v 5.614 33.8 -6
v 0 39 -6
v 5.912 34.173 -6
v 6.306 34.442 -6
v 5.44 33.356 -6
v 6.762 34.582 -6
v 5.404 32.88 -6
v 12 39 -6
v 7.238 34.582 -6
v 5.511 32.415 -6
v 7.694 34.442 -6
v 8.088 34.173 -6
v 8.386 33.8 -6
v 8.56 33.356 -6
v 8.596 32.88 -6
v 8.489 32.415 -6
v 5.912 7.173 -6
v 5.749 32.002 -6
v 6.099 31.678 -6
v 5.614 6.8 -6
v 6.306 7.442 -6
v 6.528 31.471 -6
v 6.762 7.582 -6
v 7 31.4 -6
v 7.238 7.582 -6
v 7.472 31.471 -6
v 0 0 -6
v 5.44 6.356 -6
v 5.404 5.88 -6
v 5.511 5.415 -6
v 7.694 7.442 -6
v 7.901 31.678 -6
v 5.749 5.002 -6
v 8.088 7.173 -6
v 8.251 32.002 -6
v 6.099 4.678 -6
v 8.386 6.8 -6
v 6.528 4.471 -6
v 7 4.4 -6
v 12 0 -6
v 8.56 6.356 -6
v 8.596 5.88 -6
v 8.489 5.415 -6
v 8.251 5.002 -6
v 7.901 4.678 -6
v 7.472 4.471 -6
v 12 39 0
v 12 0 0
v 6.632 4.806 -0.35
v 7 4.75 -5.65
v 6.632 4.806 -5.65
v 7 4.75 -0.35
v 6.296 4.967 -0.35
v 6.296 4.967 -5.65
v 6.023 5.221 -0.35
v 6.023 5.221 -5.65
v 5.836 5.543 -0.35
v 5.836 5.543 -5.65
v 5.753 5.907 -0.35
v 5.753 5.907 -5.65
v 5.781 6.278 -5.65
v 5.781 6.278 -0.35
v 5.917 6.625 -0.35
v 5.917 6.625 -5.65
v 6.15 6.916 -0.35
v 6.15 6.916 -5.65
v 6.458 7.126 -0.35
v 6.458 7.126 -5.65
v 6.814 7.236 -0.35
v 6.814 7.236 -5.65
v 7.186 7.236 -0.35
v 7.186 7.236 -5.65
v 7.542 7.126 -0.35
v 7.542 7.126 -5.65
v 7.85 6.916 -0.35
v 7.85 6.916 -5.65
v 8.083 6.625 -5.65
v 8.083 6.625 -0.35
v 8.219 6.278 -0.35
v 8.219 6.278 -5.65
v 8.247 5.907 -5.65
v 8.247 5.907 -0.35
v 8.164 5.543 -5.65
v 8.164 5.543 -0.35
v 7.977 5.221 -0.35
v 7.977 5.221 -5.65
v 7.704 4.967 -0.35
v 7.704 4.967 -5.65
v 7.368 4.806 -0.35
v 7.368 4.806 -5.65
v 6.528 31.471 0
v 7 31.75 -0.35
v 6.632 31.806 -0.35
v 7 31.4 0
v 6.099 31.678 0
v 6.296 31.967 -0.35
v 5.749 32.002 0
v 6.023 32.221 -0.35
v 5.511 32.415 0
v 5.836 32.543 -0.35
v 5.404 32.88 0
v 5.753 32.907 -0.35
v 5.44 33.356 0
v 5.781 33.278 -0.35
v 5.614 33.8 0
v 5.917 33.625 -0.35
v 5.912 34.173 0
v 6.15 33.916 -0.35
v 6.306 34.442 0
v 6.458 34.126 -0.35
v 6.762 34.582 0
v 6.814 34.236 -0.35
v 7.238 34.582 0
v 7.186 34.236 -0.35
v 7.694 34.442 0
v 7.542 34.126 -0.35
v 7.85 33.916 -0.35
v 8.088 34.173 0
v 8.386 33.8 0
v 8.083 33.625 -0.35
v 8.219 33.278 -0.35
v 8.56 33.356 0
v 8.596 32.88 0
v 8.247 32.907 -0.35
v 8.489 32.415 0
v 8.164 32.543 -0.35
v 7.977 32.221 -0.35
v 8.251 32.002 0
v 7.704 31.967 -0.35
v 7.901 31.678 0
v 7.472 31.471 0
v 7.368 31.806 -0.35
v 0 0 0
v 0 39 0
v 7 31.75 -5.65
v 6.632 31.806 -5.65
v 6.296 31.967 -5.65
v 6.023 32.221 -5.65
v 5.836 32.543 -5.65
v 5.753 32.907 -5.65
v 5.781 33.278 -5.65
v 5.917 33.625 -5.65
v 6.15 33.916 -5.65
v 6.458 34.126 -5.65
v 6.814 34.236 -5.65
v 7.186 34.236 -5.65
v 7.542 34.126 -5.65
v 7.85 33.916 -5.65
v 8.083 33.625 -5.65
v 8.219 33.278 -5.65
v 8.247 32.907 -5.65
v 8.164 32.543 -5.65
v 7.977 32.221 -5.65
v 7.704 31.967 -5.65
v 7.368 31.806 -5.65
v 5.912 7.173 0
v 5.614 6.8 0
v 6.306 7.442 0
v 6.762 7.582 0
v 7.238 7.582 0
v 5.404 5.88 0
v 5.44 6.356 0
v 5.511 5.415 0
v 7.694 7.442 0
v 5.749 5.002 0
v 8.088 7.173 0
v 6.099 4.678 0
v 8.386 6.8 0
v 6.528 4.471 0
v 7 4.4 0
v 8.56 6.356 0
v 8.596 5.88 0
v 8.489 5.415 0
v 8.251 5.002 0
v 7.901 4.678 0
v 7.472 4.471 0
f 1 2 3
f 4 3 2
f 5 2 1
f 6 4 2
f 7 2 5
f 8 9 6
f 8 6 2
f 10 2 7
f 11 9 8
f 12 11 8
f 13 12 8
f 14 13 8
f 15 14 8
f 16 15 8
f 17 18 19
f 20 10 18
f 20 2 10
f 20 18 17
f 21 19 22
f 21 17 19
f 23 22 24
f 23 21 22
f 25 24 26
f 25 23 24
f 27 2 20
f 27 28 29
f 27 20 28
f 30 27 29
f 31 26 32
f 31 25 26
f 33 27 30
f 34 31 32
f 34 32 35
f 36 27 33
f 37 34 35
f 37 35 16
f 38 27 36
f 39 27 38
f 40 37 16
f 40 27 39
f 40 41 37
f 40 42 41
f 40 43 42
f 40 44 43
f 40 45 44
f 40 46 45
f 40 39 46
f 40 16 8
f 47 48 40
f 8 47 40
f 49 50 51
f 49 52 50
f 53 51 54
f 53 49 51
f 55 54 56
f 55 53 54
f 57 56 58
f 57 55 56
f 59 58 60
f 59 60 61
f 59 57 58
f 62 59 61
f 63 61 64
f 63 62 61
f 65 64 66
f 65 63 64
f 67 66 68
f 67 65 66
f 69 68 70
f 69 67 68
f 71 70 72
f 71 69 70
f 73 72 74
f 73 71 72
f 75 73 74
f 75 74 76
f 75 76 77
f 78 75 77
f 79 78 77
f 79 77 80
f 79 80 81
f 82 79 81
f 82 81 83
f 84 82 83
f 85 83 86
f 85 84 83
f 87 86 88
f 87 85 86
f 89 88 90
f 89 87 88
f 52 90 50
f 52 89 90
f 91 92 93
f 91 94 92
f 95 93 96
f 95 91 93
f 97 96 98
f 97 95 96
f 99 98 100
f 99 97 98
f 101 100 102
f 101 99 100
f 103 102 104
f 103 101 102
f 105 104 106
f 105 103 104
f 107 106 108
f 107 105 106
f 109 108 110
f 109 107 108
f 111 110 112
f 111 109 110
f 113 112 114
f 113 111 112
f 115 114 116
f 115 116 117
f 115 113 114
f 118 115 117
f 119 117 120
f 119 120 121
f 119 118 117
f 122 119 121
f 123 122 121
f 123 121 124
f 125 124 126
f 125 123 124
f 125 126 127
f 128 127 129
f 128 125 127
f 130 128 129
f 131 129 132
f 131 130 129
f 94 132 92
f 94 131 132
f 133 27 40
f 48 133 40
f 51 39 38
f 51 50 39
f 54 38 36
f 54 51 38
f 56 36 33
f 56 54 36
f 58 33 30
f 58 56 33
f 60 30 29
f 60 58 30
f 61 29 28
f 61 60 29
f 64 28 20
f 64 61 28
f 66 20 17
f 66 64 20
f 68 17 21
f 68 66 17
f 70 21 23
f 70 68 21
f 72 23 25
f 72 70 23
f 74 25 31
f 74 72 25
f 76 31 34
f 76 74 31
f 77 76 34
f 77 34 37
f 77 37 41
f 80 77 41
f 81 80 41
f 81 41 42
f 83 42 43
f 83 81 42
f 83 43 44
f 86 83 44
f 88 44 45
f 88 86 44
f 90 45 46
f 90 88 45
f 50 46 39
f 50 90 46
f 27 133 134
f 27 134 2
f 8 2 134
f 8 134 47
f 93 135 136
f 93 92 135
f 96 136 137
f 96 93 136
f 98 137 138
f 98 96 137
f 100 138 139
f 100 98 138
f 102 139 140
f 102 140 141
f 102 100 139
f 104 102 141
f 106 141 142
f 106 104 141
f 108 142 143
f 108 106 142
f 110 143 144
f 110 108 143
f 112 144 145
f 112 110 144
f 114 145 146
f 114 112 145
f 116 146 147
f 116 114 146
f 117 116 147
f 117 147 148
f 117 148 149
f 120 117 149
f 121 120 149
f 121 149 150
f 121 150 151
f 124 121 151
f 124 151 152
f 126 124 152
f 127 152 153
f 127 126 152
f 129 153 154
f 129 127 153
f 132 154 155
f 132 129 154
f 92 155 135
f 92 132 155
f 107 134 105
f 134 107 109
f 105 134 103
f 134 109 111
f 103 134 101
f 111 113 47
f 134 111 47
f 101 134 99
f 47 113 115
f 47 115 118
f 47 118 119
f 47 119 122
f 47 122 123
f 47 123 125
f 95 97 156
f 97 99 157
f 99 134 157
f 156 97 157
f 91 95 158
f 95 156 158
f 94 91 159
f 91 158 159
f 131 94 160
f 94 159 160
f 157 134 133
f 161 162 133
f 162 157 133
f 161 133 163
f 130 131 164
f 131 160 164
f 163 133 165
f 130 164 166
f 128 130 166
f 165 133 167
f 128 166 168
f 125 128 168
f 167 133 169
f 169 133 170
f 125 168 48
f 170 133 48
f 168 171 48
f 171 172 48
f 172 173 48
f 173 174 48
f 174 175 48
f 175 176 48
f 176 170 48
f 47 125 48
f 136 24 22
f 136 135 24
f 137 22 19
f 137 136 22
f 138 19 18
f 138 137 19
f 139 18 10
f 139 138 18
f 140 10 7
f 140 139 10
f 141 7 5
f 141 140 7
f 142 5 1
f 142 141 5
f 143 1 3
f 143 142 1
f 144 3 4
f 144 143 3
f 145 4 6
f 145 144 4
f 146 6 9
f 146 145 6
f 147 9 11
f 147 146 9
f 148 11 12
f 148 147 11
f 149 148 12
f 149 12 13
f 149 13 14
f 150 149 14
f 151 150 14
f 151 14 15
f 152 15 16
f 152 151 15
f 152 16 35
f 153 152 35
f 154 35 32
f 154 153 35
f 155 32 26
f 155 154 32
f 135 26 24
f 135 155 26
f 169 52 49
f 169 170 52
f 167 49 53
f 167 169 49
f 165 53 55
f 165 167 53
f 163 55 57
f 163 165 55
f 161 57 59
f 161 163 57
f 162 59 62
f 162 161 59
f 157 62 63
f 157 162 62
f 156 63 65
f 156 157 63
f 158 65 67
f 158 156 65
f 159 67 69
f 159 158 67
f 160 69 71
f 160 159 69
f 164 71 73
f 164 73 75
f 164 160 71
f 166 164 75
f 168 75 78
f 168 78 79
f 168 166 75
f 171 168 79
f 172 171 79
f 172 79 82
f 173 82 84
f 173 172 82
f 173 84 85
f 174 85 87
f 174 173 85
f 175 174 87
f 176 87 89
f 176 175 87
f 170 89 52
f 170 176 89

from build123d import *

# Parameters (mm, degrees)
SKETCH_1_W                 = 12
SKETCH_1_H                 = 6
EXTRUDE_1_DEPTH            = 39
HOLE_WIZARD_M31_AT_2_COUNT = 2
HOLE_WIZARD_M31_AT_2_PITCH = 27


with BuildPart() as part:
    # Эскиз1 → Бобышка-Вытянуть1 (new body)
    with BuildSketch(Plane(origin=(0, 0, 0), x_dir=(1, 0, 0), z_dir=(0, 1, 0))):
        with Locations((6, 3)):
            Rectangle(SKETCH_1_W, SKETCH_1_H)
    extrude(amount=EXTRUDE_1_DEPTH)

    # Эскиз2 → Отверстие обработанное метчиком M31 (revolve, cut)
    with BuildSketch(Plane(origin=(7, 6, 0), x_dir=(0, -1, 0), z_dir=(1, 0, 0))):
        Polygon((0, 0), (0, 6), (1.6, 6), (1.25, 5.65), (1.25, 0.35), (1.6, 0), align=None)
    hole_wizard_m31 = revolve(axis=Axis((7, 6, 6.35), (0, 0, -1)), mode=Mode.SUBTRACT)

    # Отверстие обработанное метчиком M31 at 2: Отверстие обработанное метчиком M31 ×2
    with Locations(*[(0, i * HOLE_WIZARD_M31_AT_2_PITCH, 0) for i in range(1, HOLE_WIZARD_M31_AT_2_COUNT)]):
        add(hole_wizard_m31, mode=Mode.SUBTRACT)


solid = part.part
